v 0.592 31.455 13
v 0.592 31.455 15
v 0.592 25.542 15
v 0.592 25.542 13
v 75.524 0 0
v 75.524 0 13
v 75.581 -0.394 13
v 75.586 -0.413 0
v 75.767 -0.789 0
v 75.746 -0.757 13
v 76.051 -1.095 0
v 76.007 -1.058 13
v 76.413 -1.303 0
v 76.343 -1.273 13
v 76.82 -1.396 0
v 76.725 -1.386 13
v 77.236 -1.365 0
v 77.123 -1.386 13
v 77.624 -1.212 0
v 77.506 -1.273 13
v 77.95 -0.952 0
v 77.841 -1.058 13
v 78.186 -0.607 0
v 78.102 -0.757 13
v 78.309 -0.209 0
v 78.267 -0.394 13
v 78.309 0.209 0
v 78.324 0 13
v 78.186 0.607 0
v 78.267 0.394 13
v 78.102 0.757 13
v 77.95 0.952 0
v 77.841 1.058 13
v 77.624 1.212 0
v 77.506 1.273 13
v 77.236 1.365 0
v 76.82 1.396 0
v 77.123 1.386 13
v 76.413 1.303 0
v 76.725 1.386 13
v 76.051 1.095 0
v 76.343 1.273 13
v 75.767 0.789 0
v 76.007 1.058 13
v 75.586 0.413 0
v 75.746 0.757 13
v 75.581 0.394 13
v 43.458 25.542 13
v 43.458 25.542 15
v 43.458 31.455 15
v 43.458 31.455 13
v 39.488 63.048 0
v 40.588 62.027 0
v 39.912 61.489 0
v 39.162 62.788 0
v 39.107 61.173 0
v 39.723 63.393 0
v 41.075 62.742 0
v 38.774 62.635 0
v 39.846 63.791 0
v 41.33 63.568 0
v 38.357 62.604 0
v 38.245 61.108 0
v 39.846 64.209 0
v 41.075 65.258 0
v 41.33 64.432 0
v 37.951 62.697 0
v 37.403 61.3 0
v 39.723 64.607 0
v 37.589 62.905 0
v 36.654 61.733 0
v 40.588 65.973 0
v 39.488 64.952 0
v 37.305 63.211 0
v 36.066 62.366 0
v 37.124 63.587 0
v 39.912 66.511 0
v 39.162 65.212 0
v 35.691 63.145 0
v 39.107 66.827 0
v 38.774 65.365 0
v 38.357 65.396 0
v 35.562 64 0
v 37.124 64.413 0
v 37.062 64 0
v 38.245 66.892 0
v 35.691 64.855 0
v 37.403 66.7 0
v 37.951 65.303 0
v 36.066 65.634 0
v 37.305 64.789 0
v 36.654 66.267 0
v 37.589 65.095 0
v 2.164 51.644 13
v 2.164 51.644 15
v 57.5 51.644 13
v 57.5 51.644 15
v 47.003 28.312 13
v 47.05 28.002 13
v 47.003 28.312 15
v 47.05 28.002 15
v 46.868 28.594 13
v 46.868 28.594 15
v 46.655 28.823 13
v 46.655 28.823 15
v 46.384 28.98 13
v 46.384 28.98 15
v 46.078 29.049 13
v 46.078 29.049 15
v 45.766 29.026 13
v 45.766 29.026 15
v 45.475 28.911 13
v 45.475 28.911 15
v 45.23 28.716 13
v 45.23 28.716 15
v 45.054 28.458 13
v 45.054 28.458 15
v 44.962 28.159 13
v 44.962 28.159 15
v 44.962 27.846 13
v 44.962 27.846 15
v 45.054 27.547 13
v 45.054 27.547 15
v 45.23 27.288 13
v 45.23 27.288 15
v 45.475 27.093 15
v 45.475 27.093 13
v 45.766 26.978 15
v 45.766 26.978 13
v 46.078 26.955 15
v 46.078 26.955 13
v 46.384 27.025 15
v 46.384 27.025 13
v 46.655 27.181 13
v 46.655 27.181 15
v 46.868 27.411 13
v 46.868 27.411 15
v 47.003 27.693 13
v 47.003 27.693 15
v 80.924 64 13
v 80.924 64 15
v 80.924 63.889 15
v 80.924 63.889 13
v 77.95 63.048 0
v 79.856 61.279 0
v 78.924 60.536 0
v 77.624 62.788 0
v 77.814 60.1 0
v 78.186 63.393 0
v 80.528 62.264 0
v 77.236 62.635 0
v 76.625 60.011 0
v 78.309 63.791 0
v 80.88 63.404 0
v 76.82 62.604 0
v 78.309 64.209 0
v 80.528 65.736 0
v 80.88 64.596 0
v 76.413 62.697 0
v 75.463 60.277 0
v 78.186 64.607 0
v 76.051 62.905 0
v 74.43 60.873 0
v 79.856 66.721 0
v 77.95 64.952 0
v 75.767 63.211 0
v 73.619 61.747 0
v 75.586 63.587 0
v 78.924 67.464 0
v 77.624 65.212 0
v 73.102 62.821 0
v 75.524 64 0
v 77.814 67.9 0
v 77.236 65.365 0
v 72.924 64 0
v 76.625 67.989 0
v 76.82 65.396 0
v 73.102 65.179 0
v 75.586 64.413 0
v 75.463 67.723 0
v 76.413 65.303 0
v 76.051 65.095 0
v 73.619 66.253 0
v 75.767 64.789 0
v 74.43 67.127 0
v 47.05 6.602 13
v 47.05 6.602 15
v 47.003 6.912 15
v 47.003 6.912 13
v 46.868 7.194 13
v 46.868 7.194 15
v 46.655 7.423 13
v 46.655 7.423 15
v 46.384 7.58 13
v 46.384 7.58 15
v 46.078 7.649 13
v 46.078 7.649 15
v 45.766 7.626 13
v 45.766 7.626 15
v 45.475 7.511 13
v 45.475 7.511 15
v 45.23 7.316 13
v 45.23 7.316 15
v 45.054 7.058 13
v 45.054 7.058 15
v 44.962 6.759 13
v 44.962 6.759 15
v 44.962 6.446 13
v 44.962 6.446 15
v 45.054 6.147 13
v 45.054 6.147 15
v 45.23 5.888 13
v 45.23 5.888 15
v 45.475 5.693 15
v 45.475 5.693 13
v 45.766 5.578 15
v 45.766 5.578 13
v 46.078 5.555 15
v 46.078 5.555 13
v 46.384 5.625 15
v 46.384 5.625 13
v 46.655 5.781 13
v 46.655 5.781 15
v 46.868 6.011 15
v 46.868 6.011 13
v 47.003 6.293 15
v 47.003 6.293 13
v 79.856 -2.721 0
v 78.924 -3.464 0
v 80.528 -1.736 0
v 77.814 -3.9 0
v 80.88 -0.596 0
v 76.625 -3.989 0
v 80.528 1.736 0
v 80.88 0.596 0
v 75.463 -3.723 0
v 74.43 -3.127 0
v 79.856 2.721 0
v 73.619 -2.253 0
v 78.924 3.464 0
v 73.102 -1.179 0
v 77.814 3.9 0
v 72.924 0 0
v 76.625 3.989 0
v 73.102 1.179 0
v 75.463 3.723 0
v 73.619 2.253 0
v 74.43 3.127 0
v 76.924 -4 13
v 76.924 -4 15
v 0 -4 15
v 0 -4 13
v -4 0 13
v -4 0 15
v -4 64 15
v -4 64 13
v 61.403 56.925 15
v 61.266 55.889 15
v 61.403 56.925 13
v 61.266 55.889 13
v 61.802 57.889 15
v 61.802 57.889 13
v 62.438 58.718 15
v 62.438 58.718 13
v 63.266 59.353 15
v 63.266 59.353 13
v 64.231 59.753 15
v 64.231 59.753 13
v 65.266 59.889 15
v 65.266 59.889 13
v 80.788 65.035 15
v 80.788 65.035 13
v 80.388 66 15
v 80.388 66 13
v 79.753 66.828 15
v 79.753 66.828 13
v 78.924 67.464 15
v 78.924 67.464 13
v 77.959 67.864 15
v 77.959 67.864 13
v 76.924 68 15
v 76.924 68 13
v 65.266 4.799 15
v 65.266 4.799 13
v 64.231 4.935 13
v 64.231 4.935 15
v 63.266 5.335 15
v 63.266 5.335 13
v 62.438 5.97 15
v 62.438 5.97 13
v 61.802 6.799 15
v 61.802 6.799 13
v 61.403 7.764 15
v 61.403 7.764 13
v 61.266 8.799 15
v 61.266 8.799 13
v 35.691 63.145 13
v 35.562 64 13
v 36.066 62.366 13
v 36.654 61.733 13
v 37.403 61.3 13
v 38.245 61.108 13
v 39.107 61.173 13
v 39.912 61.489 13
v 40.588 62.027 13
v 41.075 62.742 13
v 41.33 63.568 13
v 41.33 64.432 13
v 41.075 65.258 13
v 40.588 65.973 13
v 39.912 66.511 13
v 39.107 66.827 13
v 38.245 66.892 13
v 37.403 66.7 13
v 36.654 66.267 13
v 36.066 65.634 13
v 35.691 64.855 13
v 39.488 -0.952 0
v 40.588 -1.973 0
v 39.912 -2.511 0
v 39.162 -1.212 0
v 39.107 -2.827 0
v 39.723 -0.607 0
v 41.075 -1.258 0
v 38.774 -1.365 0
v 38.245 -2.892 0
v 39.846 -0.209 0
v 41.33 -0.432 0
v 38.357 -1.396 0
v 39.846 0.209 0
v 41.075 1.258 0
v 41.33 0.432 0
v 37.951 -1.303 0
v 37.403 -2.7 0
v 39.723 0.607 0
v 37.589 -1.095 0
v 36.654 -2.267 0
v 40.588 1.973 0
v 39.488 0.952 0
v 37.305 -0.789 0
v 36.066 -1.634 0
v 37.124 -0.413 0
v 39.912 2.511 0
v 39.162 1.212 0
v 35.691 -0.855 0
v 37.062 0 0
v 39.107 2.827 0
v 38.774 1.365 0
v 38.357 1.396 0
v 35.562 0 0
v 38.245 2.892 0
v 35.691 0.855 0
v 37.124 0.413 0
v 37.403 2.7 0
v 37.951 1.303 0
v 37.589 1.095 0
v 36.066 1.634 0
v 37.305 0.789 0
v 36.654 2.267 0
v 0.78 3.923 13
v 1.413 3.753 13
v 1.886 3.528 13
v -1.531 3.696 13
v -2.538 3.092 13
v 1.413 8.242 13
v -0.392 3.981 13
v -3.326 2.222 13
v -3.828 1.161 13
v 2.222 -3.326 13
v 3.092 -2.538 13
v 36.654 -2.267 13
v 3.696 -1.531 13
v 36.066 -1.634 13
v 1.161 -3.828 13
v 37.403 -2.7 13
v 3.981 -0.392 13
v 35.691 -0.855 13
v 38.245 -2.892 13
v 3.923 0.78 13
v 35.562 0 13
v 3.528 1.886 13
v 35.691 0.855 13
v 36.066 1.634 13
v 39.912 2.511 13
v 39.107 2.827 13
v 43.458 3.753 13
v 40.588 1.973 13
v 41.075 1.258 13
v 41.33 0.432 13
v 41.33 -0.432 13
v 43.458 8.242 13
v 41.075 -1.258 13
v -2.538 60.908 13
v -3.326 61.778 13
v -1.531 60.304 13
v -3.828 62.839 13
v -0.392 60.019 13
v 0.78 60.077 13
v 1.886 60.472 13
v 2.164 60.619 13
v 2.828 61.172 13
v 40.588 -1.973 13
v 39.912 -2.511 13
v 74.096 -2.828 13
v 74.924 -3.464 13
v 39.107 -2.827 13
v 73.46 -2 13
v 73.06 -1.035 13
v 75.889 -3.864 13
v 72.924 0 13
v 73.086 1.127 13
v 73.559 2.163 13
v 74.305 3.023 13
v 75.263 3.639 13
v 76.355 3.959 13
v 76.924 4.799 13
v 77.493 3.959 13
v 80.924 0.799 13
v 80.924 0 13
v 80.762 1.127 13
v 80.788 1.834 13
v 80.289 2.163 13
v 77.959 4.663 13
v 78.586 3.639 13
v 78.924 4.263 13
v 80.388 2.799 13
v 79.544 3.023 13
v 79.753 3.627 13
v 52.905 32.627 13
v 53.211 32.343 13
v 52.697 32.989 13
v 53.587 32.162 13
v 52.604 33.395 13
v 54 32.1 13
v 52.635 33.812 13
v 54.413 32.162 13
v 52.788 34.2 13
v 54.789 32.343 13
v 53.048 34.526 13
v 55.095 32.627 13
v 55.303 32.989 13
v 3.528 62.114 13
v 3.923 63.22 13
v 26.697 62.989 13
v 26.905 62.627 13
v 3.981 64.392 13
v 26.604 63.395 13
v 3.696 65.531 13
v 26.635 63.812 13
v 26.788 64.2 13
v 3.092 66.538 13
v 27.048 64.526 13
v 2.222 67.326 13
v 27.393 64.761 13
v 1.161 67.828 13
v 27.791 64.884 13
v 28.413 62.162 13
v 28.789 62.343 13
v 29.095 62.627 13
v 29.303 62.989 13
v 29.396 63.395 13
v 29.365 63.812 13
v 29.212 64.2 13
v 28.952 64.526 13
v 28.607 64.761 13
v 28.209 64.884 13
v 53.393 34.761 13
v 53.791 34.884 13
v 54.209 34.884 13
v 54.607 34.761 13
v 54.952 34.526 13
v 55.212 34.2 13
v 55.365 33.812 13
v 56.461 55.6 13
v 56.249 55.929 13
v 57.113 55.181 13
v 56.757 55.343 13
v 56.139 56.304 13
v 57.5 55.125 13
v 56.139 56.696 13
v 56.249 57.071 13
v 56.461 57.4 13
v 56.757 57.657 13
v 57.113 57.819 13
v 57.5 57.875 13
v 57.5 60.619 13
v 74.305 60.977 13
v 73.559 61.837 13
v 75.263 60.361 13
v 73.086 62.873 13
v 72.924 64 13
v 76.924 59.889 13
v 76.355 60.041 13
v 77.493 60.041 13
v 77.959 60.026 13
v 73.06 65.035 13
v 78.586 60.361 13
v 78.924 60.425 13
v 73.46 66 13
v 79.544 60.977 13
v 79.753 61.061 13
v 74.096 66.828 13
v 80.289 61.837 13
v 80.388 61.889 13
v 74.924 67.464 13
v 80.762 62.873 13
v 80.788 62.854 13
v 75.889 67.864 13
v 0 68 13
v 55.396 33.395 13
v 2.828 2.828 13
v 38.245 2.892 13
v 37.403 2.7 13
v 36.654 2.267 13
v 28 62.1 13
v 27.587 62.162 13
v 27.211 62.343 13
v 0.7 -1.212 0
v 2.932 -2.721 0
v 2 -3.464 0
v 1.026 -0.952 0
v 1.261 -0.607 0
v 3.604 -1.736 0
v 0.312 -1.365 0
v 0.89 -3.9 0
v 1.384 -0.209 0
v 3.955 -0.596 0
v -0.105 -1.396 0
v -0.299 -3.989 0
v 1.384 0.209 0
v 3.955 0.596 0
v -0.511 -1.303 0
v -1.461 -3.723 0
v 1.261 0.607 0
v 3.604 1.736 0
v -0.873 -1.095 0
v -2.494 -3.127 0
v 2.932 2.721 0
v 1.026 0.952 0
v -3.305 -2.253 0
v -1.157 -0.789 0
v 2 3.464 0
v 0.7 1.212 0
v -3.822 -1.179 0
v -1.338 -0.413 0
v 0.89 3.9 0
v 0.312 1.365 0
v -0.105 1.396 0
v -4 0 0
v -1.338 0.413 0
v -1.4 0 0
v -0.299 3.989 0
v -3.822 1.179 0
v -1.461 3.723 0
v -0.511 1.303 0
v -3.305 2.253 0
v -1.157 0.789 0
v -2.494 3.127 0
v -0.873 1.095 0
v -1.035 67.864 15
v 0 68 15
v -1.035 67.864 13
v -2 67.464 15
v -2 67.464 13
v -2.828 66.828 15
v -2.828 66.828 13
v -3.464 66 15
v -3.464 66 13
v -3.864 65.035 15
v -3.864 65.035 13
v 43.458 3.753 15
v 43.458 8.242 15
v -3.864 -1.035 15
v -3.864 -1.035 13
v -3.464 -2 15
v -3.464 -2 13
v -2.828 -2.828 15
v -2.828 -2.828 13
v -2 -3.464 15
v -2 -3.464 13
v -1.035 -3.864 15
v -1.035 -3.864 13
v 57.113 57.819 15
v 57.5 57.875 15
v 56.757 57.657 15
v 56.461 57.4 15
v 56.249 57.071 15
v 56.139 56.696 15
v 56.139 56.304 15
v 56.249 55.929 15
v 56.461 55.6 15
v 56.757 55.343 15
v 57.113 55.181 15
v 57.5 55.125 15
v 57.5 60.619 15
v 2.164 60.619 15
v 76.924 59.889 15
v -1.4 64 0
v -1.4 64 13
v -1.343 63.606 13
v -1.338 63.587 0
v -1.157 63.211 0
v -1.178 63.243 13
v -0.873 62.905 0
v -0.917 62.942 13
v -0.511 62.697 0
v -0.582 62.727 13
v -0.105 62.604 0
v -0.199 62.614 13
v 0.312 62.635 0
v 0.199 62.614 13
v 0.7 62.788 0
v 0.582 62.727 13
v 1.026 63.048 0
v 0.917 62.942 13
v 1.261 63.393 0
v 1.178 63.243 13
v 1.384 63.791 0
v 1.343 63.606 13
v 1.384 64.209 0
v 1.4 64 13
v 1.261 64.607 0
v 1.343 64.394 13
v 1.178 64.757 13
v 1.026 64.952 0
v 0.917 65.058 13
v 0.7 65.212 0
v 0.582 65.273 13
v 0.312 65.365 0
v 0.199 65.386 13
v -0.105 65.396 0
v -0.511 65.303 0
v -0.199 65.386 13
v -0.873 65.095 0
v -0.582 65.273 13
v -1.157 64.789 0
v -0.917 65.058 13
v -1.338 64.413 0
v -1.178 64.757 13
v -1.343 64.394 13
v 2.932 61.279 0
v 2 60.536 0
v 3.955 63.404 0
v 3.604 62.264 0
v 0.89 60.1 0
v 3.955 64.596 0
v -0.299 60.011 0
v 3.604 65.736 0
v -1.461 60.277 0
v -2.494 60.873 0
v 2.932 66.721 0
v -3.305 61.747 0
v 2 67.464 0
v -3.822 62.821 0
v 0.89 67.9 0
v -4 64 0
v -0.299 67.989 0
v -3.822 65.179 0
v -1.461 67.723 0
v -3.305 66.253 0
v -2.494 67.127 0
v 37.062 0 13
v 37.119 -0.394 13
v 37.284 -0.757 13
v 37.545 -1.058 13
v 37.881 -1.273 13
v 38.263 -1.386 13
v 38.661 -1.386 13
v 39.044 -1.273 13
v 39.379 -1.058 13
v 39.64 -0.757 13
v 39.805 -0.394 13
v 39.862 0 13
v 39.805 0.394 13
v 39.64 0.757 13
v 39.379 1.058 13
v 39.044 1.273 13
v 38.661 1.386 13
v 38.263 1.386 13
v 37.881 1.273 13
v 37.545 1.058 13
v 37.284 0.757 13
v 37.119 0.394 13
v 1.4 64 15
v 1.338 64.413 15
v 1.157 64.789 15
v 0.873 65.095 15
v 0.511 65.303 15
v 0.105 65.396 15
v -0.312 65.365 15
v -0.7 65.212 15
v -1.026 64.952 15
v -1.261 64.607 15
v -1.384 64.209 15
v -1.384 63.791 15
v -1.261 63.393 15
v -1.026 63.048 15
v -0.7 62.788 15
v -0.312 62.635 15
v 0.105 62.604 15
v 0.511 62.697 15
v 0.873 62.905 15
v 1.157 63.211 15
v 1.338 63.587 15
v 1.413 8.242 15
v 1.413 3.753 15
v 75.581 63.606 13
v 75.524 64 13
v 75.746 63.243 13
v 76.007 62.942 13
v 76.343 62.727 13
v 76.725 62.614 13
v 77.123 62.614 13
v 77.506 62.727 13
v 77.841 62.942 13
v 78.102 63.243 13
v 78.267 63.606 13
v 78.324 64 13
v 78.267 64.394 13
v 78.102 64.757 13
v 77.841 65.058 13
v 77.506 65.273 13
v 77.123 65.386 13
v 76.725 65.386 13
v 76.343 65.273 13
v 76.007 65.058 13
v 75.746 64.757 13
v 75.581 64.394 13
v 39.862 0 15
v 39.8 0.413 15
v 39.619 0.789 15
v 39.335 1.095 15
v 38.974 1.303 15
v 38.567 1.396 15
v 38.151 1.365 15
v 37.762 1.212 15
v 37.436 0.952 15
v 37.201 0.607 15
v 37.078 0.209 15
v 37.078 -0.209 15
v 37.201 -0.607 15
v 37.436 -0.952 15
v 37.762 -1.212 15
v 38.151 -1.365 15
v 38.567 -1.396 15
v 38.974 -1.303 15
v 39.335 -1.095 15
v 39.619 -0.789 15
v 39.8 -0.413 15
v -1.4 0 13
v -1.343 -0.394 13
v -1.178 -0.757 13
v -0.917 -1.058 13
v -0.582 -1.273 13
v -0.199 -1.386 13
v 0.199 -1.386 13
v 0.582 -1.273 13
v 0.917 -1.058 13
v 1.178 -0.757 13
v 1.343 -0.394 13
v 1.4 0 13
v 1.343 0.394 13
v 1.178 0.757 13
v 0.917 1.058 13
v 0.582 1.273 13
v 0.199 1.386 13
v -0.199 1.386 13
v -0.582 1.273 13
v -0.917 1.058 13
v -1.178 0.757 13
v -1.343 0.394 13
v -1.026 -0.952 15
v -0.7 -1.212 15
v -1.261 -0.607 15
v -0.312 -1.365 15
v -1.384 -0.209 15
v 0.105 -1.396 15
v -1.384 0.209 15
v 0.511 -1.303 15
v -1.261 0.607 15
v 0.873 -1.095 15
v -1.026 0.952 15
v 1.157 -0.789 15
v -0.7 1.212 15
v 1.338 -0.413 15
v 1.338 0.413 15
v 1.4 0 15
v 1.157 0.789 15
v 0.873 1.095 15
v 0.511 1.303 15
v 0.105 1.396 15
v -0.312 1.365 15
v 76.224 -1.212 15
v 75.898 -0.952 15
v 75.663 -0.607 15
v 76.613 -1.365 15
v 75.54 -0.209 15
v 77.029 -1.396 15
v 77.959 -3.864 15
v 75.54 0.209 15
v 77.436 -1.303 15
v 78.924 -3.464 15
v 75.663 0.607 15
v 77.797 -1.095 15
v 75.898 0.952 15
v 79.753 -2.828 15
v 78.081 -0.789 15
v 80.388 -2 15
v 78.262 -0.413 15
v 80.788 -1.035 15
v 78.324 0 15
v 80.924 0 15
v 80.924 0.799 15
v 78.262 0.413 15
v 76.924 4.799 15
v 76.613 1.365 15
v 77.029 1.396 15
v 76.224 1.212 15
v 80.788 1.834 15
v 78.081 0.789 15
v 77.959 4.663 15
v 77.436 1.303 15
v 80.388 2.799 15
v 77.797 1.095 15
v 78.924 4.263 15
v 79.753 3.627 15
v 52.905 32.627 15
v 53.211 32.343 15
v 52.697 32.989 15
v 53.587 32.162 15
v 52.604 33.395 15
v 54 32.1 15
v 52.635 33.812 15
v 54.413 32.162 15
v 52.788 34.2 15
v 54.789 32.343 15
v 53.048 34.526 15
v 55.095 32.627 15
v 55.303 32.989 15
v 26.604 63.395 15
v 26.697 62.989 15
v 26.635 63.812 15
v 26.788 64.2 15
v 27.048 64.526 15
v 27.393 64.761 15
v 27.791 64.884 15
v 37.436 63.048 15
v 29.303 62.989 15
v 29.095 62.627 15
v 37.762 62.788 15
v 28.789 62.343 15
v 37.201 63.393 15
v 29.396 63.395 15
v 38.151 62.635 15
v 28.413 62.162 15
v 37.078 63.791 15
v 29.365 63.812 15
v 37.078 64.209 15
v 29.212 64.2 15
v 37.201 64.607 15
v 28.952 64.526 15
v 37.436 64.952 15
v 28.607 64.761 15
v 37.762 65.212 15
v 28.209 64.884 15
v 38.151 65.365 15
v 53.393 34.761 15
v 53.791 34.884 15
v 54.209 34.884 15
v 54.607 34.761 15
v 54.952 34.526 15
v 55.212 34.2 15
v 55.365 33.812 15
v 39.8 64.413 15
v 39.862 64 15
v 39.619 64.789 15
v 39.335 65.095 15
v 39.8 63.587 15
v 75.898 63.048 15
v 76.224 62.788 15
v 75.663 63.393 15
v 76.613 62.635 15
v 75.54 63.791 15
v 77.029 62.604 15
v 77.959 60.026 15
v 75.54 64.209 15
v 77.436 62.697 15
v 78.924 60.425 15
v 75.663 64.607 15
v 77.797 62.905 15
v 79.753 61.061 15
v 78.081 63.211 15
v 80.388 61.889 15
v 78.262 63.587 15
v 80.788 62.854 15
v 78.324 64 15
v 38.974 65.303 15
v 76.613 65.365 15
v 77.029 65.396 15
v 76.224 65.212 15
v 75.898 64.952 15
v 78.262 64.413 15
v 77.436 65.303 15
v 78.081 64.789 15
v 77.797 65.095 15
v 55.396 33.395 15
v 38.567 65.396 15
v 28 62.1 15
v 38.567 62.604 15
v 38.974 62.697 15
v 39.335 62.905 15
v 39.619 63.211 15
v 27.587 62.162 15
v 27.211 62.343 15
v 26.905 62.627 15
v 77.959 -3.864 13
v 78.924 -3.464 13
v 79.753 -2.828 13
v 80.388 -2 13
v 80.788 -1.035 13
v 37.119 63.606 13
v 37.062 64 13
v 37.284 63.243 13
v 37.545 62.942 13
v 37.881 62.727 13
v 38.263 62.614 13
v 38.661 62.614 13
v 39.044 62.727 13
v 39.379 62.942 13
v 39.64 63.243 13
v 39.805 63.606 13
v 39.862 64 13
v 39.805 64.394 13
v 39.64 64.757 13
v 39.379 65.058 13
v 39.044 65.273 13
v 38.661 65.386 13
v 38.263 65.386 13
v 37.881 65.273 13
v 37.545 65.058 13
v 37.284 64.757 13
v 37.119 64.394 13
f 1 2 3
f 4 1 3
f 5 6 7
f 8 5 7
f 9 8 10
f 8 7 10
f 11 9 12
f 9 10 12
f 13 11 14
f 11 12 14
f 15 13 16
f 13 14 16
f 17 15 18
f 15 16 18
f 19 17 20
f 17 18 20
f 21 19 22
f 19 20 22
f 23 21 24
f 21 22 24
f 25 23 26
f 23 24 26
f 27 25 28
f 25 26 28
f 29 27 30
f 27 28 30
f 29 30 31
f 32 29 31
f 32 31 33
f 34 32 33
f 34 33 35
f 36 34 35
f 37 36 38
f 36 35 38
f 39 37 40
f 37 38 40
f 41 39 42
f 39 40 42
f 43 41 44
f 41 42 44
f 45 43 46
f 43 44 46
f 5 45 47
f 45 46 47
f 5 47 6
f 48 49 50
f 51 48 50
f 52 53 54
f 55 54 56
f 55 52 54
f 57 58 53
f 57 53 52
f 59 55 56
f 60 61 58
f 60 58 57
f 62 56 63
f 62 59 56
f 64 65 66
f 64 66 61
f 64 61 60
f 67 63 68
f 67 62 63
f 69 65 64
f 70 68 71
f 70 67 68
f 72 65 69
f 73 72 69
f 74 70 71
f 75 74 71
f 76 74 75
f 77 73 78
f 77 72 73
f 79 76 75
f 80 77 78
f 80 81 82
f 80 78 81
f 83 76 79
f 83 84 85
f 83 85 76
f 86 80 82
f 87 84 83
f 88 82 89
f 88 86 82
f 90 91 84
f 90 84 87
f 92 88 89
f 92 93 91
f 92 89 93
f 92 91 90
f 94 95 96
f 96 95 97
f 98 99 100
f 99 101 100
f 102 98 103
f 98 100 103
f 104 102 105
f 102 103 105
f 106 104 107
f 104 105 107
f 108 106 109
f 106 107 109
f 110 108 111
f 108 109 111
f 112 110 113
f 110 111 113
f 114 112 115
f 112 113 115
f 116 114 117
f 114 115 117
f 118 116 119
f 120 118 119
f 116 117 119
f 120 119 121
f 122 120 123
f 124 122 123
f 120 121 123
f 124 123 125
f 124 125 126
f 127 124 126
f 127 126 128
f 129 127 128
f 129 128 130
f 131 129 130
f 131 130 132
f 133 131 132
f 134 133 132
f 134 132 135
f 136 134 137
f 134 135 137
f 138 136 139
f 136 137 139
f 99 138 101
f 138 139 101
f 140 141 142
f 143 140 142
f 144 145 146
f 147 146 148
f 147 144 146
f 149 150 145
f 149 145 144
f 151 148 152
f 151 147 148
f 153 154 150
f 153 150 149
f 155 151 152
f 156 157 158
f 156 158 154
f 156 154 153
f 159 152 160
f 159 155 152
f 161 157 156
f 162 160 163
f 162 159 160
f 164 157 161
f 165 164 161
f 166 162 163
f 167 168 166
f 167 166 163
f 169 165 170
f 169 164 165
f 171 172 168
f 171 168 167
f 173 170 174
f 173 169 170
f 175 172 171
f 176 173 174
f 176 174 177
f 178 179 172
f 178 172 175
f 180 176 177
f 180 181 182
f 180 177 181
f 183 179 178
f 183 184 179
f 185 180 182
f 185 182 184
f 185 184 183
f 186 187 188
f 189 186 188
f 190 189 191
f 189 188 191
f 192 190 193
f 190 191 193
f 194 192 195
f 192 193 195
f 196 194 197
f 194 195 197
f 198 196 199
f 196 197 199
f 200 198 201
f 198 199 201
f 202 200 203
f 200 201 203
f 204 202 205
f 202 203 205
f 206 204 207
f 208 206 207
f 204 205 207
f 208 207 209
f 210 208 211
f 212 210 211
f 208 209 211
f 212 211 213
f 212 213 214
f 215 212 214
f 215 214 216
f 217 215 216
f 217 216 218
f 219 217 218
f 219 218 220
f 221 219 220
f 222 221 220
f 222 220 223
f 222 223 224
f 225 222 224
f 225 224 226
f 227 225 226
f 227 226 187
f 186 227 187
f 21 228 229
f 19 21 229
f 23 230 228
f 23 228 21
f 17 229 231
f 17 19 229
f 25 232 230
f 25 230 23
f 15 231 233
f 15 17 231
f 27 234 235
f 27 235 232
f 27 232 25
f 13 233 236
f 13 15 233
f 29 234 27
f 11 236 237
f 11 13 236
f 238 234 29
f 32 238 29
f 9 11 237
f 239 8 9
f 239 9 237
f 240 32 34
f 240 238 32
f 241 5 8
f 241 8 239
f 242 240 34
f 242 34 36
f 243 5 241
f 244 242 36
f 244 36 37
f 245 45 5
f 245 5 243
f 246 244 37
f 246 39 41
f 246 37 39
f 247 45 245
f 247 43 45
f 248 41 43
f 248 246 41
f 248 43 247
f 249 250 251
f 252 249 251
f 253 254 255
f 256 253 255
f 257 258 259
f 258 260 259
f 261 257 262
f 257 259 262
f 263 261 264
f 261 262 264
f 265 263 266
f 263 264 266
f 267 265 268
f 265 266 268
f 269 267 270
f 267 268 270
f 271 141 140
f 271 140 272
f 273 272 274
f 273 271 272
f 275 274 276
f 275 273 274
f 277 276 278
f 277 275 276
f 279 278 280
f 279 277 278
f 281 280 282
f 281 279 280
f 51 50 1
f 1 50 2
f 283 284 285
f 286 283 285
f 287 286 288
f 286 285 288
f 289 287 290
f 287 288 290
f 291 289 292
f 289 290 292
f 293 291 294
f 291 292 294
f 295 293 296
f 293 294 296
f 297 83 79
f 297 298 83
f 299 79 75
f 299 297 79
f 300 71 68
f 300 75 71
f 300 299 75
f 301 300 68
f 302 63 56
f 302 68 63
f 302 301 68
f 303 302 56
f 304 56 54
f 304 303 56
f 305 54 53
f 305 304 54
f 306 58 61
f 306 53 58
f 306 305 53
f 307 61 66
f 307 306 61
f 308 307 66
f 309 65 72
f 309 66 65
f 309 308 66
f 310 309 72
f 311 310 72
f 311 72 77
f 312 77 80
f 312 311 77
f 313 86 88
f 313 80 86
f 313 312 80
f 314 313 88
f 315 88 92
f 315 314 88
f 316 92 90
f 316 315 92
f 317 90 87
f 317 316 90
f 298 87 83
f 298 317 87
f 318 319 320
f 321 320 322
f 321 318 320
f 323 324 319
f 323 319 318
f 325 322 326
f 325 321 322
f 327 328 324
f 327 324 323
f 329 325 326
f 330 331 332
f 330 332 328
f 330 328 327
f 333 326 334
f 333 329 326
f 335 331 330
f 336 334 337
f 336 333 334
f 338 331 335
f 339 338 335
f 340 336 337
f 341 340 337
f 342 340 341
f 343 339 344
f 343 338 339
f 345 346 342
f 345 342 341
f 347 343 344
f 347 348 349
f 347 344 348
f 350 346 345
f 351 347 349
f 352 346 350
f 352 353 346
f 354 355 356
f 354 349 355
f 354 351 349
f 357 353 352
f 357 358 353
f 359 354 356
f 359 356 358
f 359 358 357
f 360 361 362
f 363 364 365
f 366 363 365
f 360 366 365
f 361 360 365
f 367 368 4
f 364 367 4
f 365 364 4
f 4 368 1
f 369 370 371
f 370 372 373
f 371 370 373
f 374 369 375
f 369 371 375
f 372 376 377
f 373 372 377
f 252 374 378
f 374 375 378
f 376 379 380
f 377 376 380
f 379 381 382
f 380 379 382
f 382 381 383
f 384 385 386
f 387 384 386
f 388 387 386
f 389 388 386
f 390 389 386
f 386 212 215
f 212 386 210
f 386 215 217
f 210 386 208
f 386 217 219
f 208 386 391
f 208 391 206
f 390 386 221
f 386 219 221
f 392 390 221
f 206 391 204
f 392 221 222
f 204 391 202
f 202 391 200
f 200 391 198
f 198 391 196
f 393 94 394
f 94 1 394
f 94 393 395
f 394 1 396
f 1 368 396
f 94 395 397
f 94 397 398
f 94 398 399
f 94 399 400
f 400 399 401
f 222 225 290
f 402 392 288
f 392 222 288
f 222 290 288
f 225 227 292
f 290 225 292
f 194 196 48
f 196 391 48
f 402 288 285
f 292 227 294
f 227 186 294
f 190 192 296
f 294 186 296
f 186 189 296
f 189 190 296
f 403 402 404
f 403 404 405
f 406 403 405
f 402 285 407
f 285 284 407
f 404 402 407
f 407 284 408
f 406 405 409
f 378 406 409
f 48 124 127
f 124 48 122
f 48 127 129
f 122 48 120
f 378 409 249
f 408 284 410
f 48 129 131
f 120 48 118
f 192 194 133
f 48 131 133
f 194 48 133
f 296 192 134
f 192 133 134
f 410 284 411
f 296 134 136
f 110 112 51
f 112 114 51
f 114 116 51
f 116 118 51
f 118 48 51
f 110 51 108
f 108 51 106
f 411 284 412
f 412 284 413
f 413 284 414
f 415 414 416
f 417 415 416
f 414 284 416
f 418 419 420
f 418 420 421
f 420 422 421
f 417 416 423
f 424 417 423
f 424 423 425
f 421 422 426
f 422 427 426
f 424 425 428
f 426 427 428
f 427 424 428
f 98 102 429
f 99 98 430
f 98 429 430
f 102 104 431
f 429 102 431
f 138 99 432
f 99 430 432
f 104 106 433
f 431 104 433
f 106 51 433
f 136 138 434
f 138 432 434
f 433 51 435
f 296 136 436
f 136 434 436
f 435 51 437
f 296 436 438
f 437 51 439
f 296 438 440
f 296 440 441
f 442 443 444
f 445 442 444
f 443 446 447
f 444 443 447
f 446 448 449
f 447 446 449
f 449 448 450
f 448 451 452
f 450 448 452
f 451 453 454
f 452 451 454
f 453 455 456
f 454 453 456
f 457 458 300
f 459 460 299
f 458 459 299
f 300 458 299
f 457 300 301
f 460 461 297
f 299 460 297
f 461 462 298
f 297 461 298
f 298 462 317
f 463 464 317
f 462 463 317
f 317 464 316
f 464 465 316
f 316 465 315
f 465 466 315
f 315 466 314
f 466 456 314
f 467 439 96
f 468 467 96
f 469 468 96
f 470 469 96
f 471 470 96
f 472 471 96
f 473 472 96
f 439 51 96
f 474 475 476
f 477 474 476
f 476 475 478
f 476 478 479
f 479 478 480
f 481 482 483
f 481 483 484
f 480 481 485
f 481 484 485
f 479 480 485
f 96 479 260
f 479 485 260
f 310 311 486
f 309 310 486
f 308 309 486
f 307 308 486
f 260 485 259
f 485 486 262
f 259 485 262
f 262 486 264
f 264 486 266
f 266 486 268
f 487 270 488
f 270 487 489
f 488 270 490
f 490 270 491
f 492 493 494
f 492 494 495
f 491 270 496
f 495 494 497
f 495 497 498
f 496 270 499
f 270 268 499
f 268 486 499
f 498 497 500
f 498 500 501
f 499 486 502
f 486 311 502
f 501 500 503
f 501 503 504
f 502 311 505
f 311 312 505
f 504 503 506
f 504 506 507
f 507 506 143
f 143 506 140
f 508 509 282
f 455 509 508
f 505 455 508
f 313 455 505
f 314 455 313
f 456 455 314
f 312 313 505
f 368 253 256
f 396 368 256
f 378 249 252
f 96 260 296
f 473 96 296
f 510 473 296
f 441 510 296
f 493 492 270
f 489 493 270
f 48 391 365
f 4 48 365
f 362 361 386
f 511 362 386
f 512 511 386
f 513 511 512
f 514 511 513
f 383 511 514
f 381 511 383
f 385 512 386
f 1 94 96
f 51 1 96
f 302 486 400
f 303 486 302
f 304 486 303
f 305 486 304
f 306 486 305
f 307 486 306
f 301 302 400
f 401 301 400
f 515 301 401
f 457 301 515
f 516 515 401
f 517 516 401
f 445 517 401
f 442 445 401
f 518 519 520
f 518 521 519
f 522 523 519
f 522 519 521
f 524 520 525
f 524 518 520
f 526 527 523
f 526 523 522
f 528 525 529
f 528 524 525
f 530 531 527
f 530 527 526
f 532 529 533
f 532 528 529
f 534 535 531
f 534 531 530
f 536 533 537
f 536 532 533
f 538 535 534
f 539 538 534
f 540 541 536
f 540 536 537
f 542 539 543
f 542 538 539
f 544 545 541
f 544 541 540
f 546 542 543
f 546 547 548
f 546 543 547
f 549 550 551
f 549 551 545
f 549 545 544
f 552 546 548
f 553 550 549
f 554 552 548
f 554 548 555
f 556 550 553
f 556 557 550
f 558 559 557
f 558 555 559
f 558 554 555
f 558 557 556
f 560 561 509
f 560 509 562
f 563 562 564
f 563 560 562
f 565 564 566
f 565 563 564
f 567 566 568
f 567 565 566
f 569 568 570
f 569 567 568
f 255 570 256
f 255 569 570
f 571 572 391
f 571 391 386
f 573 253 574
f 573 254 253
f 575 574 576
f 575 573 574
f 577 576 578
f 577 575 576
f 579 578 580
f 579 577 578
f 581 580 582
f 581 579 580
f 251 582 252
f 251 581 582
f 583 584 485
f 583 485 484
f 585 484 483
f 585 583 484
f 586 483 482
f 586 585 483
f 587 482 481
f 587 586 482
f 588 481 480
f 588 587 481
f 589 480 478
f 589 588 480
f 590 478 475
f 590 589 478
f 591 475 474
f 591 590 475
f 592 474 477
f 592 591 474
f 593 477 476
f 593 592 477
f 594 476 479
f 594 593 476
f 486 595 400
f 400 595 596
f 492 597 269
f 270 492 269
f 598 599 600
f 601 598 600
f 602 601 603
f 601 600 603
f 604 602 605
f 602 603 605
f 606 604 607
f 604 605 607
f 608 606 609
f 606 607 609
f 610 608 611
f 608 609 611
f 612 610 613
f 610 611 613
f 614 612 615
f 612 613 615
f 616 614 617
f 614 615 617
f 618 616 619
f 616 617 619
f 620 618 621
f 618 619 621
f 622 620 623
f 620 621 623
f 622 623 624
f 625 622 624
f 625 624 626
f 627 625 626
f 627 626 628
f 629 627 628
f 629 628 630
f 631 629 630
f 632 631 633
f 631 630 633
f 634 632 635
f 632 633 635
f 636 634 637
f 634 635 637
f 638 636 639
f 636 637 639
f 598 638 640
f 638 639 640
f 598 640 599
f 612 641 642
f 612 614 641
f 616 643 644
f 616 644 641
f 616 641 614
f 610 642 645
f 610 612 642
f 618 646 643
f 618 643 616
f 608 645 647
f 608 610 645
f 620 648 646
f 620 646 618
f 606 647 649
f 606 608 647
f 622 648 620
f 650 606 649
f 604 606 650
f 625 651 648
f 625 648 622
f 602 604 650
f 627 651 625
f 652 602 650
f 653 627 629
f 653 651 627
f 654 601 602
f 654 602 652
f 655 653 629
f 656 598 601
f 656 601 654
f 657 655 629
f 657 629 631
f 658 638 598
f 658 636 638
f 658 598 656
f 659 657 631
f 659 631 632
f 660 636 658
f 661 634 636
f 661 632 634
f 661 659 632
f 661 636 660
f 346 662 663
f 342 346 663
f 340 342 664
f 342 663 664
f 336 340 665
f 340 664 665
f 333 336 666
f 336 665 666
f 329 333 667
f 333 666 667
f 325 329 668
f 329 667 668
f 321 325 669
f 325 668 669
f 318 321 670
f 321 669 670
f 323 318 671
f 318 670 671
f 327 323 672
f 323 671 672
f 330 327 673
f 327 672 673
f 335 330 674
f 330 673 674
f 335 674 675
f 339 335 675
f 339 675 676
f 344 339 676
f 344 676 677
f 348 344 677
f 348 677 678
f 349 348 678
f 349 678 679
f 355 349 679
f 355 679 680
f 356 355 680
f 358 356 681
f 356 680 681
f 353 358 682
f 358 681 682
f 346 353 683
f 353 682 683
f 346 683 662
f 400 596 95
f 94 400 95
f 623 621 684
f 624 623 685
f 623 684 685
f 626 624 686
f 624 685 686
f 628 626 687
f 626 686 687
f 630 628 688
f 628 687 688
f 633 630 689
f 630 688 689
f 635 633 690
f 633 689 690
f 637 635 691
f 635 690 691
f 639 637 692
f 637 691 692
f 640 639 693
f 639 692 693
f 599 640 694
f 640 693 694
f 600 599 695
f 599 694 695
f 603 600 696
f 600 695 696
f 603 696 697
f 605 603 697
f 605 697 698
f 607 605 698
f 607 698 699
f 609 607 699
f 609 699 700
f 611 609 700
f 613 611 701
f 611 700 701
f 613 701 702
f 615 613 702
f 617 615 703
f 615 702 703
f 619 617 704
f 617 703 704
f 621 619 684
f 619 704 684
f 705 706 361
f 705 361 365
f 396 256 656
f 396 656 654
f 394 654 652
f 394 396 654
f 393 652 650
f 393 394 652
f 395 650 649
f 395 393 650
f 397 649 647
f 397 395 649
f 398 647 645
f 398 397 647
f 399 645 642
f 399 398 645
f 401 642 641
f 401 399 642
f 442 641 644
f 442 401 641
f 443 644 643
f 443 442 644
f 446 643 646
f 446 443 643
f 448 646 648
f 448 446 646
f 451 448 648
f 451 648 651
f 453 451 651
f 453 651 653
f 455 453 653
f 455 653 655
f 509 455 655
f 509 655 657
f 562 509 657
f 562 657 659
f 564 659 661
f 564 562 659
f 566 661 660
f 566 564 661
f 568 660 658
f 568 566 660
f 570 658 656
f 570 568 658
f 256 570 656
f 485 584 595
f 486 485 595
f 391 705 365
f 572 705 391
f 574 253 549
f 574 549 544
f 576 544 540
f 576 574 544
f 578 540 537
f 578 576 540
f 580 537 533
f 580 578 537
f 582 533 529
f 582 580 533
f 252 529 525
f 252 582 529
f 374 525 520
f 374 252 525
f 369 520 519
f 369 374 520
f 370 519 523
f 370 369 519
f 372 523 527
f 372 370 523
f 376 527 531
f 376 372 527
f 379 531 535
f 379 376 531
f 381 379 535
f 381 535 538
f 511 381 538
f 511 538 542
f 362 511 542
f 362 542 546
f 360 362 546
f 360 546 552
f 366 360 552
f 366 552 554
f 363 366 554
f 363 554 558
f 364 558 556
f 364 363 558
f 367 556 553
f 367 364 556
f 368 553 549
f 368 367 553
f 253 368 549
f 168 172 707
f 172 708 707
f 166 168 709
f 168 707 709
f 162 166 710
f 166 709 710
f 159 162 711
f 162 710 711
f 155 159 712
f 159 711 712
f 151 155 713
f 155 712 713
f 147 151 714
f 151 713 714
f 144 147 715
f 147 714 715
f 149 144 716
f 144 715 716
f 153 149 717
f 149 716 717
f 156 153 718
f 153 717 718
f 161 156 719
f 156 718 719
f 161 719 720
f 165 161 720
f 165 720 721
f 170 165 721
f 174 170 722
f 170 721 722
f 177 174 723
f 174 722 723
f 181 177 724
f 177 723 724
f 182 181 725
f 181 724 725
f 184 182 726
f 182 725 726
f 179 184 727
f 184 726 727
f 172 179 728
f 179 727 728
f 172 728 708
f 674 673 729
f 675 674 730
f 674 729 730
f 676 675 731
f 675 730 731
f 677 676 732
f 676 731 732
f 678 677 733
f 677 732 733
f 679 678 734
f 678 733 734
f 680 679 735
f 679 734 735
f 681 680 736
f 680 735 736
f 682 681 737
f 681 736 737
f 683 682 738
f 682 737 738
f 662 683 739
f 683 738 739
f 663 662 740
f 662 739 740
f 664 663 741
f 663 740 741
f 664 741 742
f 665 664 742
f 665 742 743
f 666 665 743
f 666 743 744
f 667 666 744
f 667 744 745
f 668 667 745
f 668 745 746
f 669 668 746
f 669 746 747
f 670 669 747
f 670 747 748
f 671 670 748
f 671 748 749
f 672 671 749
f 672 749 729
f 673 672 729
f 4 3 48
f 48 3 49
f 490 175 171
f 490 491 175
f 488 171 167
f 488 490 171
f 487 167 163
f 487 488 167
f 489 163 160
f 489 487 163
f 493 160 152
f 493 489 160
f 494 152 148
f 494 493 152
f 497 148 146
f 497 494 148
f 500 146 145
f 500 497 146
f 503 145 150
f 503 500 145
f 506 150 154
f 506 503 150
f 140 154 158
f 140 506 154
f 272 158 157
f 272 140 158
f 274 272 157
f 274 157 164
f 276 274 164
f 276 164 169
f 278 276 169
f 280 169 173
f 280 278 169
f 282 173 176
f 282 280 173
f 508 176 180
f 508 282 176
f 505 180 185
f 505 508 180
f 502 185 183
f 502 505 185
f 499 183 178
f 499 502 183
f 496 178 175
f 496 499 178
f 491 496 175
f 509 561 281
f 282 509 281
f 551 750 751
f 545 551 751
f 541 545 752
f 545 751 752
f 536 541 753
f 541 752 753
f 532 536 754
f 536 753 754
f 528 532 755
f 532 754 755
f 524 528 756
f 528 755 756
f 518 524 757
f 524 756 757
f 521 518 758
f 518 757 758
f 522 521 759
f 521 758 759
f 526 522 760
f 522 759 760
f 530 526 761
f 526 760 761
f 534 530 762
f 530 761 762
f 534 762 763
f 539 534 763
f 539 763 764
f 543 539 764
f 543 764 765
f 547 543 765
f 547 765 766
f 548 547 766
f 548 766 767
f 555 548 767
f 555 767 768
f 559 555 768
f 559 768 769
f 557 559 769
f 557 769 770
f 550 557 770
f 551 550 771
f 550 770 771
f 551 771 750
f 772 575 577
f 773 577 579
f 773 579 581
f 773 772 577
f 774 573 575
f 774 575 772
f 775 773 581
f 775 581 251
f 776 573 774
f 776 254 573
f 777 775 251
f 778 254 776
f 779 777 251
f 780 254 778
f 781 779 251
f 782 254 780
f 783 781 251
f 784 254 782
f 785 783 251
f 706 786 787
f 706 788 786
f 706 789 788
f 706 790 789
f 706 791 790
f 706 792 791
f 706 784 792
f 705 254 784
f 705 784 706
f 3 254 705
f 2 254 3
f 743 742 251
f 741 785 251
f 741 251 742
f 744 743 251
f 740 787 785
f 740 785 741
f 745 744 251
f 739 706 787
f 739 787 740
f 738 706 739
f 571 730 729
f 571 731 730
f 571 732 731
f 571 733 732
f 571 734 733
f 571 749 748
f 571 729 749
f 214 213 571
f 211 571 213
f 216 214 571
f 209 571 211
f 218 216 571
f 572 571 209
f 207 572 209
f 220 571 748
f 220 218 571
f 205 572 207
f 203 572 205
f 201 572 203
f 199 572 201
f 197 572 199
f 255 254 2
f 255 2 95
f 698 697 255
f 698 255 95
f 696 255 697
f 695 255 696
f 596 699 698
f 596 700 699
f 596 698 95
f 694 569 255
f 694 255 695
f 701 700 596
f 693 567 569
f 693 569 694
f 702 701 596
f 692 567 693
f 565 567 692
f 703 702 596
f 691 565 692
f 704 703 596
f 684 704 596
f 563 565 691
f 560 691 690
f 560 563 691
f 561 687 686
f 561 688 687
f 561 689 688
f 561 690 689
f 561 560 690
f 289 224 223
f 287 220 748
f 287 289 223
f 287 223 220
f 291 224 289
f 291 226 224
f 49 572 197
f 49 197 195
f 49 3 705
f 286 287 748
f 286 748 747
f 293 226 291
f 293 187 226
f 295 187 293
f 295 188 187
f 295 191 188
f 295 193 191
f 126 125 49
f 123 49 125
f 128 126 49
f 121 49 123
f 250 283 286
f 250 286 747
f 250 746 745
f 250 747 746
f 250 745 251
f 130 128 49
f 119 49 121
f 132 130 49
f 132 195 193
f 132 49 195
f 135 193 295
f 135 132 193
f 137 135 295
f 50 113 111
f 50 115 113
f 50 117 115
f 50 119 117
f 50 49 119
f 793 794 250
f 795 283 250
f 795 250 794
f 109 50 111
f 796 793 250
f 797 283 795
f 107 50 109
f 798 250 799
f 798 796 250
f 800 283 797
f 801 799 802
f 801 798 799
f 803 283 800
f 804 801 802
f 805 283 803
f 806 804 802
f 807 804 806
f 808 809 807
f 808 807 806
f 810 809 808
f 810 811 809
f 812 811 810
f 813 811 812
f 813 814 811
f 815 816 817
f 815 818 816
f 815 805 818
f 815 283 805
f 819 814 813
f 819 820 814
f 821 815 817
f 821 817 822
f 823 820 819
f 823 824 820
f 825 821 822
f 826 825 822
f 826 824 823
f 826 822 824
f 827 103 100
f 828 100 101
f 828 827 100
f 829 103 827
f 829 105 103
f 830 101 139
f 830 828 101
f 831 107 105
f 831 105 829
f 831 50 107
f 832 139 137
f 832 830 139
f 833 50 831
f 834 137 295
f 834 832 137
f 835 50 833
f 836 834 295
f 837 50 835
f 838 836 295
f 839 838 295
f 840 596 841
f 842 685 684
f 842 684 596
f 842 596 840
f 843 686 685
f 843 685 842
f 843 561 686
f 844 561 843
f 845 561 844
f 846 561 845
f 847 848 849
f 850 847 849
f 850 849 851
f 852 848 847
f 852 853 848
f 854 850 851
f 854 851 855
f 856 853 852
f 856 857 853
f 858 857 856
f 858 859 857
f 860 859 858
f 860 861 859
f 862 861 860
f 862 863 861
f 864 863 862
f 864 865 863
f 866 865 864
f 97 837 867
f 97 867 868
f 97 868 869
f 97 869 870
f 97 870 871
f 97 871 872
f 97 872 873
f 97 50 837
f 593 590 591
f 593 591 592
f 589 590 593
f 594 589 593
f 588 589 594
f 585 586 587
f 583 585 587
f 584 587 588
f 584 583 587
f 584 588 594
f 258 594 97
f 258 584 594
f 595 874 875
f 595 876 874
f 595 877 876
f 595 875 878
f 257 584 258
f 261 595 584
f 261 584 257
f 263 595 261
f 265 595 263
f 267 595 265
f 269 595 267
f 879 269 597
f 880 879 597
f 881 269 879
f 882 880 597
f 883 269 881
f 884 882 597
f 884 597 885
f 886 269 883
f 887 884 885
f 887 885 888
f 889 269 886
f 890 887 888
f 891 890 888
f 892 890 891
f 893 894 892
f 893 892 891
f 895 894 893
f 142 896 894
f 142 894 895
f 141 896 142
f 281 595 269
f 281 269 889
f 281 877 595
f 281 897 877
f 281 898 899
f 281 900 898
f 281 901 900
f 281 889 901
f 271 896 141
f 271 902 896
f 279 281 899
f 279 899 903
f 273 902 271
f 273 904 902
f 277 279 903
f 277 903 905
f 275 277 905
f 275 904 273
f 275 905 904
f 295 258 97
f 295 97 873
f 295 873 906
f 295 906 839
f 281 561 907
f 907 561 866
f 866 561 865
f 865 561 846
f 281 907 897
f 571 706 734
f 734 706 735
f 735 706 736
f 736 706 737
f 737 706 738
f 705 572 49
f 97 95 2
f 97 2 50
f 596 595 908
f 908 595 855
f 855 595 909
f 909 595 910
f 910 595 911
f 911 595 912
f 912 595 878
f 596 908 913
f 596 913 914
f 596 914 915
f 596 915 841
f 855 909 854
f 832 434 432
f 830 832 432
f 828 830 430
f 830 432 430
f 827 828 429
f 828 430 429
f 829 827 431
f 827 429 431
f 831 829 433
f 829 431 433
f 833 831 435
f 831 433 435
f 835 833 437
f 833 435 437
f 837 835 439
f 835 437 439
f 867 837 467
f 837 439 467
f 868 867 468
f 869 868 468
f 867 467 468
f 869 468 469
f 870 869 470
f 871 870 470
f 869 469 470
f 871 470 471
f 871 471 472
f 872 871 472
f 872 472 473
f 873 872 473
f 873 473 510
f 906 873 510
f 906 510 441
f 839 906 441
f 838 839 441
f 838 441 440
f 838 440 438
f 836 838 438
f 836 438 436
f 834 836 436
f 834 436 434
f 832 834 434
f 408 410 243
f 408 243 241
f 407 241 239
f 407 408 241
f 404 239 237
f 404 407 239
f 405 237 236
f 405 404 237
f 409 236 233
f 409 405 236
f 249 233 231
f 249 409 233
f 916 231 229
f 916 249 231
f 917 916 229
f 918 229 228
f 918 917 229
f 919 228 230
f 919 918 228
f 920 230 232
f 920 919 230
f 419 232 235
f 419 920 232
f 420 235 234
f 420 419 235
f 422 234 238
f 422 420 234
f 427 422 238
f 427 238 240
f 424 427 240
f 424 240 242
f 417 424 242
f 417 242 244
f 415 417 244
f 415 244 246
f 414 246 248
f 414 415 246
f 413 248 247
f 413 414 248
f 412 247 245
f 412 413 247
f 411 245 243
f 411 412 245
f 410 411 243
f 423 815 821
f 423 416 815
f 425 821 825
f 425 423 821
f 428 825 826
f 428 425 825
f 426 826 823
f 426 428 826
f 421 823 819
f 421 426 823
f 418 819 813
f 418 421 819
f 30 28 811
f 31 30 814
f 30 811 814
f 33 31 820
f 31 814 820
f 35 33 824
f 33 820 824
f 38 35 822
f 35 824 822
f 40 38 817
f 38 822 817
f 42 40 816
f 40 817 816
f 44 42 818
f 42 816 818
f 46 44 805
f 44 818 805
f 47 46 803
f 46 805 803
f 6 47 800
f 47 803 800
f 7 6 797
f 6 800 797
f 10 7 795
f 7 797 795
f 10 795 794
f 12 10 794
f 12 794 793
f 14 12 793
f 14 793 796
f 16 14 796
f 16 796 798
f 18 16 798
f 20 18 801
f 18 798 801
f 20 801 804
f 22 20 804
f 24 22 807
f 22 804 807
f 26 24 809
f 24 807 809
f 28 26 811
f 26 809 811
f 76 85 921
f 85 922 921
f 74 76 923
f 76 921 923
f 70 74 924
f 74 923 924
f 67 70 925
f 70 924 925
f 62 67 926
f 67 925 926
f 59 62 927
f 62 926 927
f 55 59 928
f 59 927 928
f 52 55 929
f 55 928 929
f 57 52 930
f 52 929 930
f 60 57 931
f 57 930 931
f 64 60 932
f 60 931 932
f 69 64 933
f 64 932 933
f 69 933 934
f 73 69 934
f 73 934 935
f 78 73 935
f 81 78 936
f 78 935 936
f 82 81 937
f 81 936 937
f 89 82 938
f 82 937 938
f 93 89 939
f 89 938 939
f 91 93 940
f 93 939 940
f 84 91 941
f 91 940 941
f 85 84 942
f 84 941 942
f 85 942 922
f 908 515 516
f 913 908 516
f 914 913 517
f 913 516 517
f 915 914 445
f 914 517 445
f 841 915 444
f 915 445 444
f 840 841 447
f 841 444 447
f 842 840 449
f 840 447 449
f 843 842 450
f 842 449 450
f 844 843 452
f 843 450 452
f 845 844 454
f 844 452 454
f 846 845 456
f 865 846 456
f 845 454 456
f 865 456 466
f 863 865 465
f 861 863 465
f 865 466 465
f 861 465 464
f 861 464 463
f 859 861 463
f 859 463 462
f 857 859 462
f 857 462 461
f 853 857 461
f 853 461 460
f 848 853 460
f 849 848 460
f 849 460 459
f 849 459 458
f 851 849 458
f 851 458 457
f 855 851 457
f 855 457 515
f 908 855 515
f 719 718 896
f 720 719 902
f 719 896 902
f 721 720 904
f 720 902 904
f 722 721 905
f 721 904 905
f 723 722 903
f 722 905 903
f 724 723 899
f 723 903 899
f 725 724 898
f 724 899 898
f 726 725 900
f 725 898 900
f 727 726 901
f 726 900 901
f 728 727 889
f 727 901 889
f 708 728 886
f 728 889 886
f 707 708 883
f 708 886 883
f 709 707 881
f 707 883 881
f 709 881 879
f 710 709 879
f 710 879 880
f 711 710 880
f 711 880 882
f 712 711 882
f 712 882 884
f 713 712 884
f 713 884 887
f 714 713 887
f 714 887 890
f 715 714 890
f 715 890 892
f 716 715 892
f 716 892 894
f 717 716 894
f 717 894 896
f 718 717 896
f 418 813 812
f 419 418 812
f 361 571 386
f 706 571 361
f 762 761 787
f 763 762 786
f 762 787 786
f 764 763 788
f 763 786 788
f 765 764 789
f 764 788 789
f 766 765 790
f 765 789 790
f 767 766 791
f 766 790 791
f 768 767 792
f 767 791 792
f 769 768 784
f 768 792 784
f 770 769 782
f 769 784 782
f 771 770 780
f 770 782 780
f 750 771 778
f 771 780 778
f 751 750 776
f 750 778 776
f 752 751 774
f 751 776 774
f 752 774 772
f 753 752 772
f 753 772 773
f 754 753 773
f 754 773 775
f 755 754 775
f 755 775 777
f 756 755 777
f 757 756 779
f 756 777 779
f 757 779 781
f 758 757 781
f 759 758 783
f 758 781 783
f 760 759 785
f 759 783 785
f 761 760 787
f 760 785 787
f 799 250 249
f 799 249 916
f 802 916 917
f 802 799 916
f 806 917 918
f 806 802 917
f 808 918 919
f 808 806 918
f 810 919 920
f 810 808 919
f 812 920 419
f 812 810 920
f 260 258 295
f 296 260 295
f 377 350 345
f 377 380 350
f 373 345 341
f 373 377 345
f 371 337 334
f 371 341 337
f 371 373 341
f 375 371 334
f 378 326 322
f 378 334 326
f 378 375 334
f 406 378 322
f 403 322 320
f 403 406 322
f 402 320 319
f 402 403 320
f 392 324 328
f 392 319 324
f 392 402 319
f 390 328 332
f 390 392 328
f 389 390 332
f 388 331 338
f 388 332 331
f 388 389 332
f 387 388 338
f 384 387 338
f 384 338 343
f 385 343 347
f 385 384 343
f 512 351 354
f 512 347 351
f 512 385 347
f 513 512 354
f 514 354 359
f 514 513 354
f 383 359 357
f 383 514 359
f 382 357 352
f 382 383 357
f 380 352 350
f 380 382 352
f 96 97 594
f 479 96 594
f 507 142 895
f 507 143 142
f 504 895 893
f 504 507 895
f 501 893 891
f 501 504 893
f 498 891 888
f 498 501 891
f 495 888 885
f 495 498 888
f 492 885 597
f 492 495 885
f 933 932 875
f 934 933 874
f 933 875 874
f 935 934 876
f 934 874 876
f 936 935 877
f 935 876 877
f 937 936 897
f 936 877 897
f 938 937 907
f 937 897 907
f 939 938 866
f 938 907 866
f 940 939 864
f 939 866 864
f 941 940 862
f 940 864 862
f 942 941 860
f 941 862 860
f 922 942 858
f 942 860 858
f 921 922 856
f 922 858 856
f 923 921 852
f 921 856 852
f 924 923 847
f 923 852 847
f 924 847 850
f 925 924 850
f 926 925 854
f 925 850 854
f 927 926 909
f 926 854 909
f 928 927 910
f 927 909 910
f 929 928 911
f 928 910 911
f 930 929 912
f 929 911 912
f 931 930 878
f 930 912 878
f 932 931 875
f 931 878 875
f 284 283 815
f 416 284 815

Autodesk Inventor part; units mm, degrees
ref_plane "YZ Plane" through (0, 0, 0) normal (1, 0, 0) x (0, 1, 0)
ref_plane "XZ Plane" through (0, 0, 0) normal (0, 1, 0) x (-1, 0, 0)
ref_plane "Work Plane1" through (0, 0, 15) normal (0, 0, 1) x (1, 0, 0)
sketch "Sketch1" plane through (0, 0, 15) normal (0, 0, 1) x (1, 0, 0)
  circle A0 centre (0, 64) radius 1.4 projected
  circle A1 centre (0, 0) radius 1.4 projected
  circle A2 centre (38.4621, 0) radius 1.4 projected
  circle A3 centre (76.9242, 0) radius 1.4 projected
  circle A4 centre (76.9242, 64) radius 1.4 projected
  circle A5 centre (38.4621, 64) radius 1.4 projected
  circle A6 centre (-0.5, 56.5) radius 1.375 projected
  circle A7 centre (-0.5, 7.5) radius 1.375 projected
  circle A8 centre (57.5, 7.5) radius 1.375 projected
  circle A9 centre (57.5, 56.5) radius 1.375 projected
  line L0 (0, 68) -> (76.9242, 68) projected
  arc A10 (80.9242, 64) -> (76.9242, 68) centre (76.9242, 64) ccw projected
  line L1 (80.9242, 64) -> (80.9242, 0) projected
  arc A11 (76.9242, -4) -> (80.9242, 0) centre (76.9242, 0) ccw projected
  line L2 (76.9242, -4) -> (0, -4) projected
  arc A12 (-4, 0) -> (0, -4) centre (0, 0) ccw projected
  line L3 (-4, 0) -> (-4, 64) projected
  arc A13 (0, 68) -> (-4, 64) centre (0, 64) ccw projected
  line L4 (57.5, 60.619) -> (2.1636, 60.619)
  line L5 (2.1636, 60.619) -> (2.1636, 51.644)
  line L6 (2.1636, 51.644) -> (57.5, 51.644)
  line L7 (57.5, 51.644) -> (57.5, 60.619)
  line L8 (80.9242, 59.8893) -> (61.2665, 59.8893)
  line L9 (61.2665, 59.8893) -> (61.2665, 4.7989)
  line L10 (61.2665, 4.7989) -> (80.9242, 4.7989)
  line L11 (80.9242, 4.7989) -> (80.9242, 59.8893)
  point P0 (0, 0)
extrude "Extrusion1" add sketch "Sketch1" against normal blind 2 contours A6 | A7 | A8 | A9 L7 | L7 A9 | L0 A10 L1 L8 L9 L10 A11 L2 A12 L3 A13
sketch "Sketch2" plane through (0, 0, 13) normal (0, 0, -1) x (-1, 0, 0)
  circle A0 centre (-38.4621, 0) radius 2.9 projected
  circle A1 centre (-38.4621, 64) radius 2.9 projected
  circle A2 centre (0, 0) radius 1.4 projected
  circle A3 centre (-38.4621, 0) radius 1.4 projected
  circle A4 centre (-76.9242, 0) radius 1.4 projected
  circle A5 centre (-76.9242, 64) radius 1.4 projected
  circle A6 centre (-38.4621, 64) radius 1.4 projected
  circle A7 centre (0, 64) radius 1.4 projected
  circle A8 centre (-76.9242, 0) radius 4
  circle A9 centre (-76.9242, 64) radius 4
  circle A10 centre (0, 64) radius 4
  circle A11 centre (0, 0) radius 4
  point P0 (0, 0)
ref_plane "Work Plane2" through (-3.375, 53.625, 0) normal (0, 0, 1) x (1, 0, 0)
extrude "Extrusion2" add sketch "Sketch2" along normal up to surface (13 mm away)
fillet "Fillet1" radius 4 4 edges at (61.2665, 4.7989, 14) (61.2665, 59.8893, 14) (80.9242, 59.8893, 14) (80.9242, 4.7989, 14)
sketch "Sketch3" plane through (0, 0, 15) normal (0, 0, 1) x (1, 0, 0)
  circle A0 centre (46, 6.6021) radius 1.05 projected
  line L0 (48, 30.0021) -> (-9, 30.0021) projected
  line L1 (-9, 30.0021) -> (-9, 4.6021) projected
  line L2 (-9, 4.6021) -> (48, 4.6021) projected
  line L3 (48, 4.6021) -> (48, 30.0021) projected
  circle A1 centre (-1, 27.9021) radius 1.05 projected
  circle A2 centre (46, 6.6021) radius 1.05 projected
  circle A3 centre (46, 28.0021) radius 1.05 projected
  circle A4 centre (-0.5, 7.5) radius 1.375 projected
  line L4 (43.458, 3.7531) -> (1.4128, 3.7531)
  line L5 (1.4128, 3.7531) -> (1.4128, 8.2423)
  line L6 (1.4128, 8.2423) -> (43.458, 8.2423)
  line L7 (43.458, 8.2423) -> (43.458, 3.7531)
  line L8 (43.458, 31.4547) -> (0.5917, 31.4547)
  line L9 (0.5917, 31.4547) -> (0.5917, 25.5421)
  line L10 (0.5917, 25.5421) -> (43.458, 25.5421)
  line L11 (43.458, 25.5421) -> (43.458, 31.4547)
  point P0 (0, 0)
extrude "Extrusion3" cut sketch "Sketch3" against normal through all contours A0 | L11 L10 L9 L0 | L0 L9 L8 L11 | L7 L4 L5 L2 | L2 L5 L6 L7 | A3
sketch "Sketch4" plane through (0, 0, 15) normal (0, 0, 1) x (1, 0, 0)
  line L0 (76.9242, 68) -> (0, 68) projected
  line L1 (-4, 64) -> (-4, 0) projected
  point P0 (0, 0)
  point P1 (28, 63.5)
  point P2 (54, 33.5)
  dimension "d8" = 4.5
  dimension "d9" = 32
  dimension "d10" = 30
  dimension "d11" = 26
hole "Hole1" at (28, 63.5, 15) at (54, 33.5, 15) direction (0, 0, -1) diameter 2.8 depth 20 tip angle 118
properties part number "cellSTORM_v5_Electronicbox_midlayer"
